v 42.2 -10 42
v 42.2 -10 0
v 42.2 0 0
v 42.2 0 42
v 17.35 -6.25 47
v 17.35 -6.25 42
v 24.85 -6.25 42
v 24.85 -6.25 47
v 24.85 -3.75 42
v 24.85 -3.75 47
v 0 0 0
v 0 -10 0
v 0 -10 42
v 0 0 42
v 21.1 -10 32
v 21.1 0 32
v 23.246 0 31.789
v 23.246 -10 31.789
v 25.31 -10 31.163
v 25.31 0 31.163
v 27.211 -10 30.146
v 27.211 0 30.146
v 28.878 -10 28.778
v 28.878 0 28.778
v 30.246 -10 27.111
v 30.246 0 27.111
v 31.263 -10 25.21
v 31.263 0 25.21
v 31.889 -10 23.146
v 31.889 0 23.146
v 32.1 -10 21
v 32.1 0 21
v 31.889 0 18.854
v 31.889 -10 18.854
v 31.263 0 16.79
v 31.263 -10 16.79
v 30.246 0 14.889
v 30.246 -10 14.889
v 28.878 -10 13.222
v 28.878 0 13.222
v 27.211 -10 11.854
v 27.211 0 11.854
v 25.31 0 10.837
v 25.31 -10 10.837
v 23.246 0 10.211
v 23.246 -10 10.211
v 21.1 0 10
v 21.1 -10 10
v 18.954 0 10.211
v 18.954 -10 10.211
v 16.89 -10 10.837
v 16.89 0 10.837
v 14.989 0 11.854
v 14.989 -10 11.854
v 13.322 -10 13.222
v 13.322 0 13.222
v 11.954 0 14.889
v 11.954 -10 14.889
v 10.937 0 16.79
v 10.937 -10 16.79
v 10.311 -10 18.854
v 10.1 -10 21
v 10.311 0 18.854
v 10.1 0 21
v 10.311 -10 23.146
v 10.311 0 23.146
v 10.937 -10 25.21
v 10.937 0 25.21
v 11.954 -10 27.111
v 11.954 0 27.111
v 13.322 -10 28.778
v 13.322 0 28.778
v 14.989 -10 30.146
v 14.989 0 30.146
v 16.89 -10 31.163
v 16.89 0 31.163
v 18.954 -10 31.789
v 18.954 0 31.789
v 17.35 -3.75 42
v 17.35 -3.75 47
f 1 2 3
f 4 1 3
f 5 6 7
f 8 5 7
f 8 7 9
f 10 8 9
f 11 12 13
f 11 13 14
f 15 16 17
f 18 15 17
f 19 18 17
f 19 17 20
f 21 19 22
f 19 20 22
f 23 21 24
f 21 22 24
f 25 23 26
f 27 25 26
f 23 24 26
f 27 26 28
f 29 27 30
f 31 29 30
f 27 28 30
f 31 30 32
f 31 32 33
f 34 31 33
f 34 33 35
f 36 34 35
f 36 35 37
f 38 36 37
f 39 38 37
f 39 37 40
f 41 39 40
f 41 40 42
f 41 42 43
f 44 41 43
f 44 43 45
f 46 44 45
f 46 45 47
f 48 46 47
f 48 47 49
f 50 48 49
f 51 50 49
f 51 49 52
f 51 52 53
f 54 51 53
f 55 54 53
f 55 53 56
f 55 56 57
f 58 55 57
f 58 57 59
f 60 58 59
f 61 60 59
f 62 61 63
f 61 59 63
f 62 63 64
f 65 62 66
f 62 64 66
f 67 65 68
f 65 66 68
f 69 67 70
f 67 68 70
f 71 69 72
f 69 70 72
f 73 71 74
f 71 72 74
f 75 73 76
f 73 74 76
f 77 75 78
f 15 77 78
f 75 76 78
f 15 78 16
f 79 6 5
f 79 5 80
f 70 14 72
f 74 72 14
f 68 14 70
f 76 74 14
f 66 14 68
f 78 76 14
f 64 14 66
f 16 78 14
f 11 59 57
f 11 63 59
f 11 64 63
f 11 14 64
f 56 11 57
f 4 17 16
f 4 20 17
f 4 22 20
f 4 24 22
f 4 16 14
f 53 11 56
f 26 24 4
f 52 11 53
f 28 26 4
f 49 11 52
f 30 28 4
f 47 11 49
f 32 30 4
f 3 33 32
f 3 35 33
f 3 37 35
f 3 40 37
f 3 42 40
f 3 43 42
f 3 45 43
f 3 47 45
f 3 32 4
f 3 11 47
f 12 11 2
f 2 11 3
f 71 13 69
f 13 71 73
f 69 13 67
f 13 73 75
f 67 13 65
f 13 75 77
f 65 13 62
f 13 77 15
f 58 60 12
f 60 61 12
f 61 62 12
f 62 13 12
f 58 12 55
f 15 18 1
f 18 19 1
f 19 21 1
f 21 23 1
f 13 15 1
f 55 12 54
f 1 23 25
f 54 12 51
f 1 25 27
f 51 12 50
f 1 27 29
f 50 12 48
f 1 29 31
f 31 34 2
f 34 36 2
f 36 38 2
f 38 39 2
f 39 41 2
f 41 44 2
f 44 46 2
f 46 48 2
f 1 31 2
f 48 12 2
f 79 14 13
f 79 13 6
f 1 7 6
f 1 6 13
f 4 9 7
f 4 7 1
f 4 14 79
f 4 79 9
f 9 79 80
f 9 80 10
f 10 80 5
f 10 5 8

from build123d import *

# Parameters (mm, degrees)
CROQUIS1_W              = 42.2
CROQUIS1_H              = 10
SALIENTE_EXTRUIR1_DEPTH = 42
CROQUIS2_W              = 7.5
CROQUIS2_H              = 2.5
SALIENTE_EXTRUIR2_DEPTH = 5
CROQUIS3_R              = 11
CORTAR_EXTRUIR1_DEPTH   = 25


with BuildPart() as part:
    # Croquis1 → Saliente-Extruir1 (new body)
    with BuildSketch(Plane.XY):
        with Locations((21.1, -5)):
            Rectangle(CROQUIS1_W, CROQUIS1_H)
    extrude(amount=SALIENTE_EXTRUIR1_DEPTH)

    # Croquis2 → Saliente-Extruir2 (add)
    with BuildSketch(Plane.XY.offset(42)):
        with Locations((21.1, -5)):
            Rectangle(CROQUIS2_W, CROQUIS2_H)
    extrude(amount=SALIENTE_EXTRUIR2_DEPTH)

    # Croquis3 → Cortar-Extruir1 (cut)
    with BuildSketch(Plane(origin=(0, 0, 0), x_dir=(1, 0, 0), z_dir=(0, 1, 0))):
        with Locations(Location((21.1, -21, 0), (0, 0, 270))):
            Circle(CROQUIS3_R)
    extrude(amount=-CORTAR_EXTRUIR1_DEPTH, mode=Mode.SUBTRACT)


solid = part.part
